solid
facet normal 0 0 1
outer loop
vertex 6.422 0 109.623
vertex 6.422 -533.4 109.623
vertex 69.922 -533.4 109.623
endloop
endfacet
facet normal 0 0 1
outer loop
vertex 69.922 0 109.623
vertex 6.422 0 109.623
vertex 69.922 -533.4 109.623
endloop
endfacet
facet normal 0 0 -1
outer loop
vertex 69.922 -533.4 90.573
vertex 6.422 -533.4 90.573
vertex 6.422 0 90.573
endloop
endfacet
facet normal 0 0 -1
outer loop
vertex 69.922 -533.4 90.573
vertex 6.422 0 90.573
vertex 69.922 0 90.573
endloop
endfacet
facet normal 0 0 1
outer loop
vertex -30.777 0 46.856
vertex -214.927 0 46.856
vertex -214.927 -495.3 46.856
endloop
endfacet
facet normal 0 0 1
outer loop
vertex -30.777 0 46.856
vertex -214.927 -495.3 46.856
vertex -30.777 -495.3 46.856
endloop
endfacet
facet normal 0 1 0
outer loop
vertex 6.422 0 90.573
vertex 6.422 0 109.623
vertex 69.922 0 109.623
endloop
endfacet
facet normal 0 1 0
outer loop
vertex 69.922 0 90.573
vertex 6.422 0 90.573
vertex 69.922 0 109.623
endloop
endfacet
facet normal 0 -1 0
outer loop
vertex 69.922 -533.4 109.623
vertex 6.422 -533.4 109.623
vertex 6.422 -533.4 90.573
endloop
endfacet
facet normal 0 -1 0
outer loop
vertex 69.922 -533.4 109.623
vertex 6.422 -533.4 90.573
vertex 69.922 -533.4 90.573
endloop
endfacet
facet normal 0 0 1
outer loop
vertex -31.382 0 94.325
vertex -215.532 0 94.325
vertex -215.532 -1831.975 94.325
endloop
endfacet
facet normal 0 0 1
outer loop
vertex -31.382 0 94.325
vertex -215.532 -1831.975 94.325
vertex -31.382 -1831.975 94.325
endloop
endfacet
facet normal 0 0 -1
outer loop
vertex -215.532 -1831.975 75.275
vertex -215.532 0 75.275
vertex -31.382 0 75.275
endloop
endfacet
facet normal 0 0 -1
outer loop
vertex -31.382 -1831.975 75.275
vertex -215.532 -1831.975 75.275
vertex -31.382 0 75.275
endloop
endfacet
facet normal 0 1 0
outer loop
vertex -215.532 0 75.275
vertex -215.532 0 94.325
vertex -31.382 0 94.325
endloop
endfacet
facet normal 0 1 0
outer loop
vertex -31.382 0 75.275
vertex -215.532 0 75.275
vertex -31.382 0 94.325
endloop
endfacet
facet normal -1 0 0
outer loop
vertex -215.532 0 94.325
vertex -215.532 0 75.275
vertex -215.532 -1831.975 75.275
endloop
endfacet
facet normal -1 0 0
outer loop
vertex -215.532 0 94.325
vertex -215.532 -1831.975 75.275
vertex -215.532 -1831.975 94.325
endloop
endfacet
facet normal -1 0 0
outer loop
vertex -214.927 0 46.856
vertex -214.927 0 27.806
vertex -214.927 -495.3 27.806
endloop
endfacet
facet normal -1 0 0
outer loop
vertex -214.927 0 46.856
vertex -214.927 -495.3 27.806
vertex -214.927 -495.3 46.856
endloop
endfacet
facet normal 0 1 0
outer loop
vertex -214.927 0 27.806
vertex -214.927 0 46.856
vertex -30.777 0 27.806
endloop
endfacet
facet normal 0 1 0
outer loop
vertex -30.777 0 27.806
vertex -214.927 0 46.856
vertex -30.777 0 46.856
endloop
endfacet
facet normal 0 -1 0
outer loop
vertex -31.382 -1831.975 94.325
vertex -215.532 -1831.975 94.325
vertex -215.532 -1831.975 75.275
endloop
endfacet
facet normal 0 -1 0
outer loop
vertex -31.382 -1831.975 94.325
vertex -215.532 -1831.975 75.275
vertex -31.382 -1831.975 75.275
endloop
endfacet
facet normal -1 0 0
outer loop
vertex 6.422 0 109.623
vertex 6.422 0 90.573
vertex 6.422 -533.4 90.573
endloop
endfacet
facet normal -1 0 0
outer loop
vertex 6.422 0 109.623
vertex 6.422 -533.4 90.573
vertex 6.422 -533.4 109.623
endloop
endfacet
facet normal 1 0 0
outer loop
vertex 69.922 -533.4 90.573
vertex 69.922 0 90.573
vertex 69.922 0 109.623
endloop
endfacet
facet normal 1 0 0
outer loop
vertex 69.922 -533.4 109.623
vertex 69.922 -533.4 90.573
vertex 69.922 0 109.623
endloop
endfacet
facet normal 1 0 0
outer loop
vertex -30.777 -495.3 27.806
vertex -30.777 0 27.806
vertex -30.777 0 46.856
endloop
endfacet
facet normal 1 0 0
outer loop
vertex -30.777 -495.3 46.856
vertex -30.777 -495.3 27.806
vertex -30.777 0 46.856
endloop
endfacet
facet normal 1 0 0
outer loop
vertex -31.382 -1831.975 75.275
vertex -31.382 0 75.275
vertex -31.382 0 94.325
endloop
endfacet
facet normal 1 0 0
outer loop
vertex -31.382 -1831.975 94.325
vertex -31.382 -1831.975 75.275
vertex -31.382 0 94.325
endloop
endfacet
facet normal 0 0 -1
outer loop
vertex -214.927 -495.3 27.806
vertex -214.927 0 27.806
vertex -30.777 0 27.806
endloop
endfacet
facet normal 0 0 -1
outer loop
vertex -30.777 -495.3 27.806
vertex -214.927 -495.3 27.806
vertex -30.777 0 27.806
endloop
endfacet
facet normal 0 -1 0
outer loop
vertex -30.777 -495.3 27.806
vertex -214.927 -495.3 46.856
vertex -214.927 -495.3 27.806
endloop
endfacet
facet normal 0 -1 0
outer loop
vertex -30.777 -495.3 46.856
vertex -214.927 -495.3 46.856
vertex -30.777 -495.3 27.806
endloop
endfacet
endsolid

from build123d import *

# Parameters (mm, degrees)
F0_W     = 184.15
F0_H     = 19.05
F1_DEPTH = 1831.975
F0_W_2   = 63.5
F2_DEPTH = 533.4
F3_DEPTH = 495.3


with BuildPart() as f1:
    # F0 (on Front) → F1 (new body)
    with BuildSketch(Plane.XZ):
        with Locations((-123.456841, 84.800116)):
            Rectangle(F0_W, F0_H)
    extrude(amount=F1_DEPTH)


with BuildPart() as f2:
    # F0 (on Front) → F2 (new body)
    with BuildSketch(Plane.XZ):
        with Locations((38.172128, 100.0977)):
            Rectangle(F0_W_2, F0_H)
    extrude(amount=F2_DEPTH)


with BuildPart() as f3:
    # F0 (on Front) → F3 (new body)
    with BuildSketch(Plane.XZ):
        with Locations((-122.85168, 37.331249)):
            Rectangle(F0_W, F0_H)
    extrude(amount=F3_DEPTH)


solid = Compound([f1.part, f2.part, f3.part])
